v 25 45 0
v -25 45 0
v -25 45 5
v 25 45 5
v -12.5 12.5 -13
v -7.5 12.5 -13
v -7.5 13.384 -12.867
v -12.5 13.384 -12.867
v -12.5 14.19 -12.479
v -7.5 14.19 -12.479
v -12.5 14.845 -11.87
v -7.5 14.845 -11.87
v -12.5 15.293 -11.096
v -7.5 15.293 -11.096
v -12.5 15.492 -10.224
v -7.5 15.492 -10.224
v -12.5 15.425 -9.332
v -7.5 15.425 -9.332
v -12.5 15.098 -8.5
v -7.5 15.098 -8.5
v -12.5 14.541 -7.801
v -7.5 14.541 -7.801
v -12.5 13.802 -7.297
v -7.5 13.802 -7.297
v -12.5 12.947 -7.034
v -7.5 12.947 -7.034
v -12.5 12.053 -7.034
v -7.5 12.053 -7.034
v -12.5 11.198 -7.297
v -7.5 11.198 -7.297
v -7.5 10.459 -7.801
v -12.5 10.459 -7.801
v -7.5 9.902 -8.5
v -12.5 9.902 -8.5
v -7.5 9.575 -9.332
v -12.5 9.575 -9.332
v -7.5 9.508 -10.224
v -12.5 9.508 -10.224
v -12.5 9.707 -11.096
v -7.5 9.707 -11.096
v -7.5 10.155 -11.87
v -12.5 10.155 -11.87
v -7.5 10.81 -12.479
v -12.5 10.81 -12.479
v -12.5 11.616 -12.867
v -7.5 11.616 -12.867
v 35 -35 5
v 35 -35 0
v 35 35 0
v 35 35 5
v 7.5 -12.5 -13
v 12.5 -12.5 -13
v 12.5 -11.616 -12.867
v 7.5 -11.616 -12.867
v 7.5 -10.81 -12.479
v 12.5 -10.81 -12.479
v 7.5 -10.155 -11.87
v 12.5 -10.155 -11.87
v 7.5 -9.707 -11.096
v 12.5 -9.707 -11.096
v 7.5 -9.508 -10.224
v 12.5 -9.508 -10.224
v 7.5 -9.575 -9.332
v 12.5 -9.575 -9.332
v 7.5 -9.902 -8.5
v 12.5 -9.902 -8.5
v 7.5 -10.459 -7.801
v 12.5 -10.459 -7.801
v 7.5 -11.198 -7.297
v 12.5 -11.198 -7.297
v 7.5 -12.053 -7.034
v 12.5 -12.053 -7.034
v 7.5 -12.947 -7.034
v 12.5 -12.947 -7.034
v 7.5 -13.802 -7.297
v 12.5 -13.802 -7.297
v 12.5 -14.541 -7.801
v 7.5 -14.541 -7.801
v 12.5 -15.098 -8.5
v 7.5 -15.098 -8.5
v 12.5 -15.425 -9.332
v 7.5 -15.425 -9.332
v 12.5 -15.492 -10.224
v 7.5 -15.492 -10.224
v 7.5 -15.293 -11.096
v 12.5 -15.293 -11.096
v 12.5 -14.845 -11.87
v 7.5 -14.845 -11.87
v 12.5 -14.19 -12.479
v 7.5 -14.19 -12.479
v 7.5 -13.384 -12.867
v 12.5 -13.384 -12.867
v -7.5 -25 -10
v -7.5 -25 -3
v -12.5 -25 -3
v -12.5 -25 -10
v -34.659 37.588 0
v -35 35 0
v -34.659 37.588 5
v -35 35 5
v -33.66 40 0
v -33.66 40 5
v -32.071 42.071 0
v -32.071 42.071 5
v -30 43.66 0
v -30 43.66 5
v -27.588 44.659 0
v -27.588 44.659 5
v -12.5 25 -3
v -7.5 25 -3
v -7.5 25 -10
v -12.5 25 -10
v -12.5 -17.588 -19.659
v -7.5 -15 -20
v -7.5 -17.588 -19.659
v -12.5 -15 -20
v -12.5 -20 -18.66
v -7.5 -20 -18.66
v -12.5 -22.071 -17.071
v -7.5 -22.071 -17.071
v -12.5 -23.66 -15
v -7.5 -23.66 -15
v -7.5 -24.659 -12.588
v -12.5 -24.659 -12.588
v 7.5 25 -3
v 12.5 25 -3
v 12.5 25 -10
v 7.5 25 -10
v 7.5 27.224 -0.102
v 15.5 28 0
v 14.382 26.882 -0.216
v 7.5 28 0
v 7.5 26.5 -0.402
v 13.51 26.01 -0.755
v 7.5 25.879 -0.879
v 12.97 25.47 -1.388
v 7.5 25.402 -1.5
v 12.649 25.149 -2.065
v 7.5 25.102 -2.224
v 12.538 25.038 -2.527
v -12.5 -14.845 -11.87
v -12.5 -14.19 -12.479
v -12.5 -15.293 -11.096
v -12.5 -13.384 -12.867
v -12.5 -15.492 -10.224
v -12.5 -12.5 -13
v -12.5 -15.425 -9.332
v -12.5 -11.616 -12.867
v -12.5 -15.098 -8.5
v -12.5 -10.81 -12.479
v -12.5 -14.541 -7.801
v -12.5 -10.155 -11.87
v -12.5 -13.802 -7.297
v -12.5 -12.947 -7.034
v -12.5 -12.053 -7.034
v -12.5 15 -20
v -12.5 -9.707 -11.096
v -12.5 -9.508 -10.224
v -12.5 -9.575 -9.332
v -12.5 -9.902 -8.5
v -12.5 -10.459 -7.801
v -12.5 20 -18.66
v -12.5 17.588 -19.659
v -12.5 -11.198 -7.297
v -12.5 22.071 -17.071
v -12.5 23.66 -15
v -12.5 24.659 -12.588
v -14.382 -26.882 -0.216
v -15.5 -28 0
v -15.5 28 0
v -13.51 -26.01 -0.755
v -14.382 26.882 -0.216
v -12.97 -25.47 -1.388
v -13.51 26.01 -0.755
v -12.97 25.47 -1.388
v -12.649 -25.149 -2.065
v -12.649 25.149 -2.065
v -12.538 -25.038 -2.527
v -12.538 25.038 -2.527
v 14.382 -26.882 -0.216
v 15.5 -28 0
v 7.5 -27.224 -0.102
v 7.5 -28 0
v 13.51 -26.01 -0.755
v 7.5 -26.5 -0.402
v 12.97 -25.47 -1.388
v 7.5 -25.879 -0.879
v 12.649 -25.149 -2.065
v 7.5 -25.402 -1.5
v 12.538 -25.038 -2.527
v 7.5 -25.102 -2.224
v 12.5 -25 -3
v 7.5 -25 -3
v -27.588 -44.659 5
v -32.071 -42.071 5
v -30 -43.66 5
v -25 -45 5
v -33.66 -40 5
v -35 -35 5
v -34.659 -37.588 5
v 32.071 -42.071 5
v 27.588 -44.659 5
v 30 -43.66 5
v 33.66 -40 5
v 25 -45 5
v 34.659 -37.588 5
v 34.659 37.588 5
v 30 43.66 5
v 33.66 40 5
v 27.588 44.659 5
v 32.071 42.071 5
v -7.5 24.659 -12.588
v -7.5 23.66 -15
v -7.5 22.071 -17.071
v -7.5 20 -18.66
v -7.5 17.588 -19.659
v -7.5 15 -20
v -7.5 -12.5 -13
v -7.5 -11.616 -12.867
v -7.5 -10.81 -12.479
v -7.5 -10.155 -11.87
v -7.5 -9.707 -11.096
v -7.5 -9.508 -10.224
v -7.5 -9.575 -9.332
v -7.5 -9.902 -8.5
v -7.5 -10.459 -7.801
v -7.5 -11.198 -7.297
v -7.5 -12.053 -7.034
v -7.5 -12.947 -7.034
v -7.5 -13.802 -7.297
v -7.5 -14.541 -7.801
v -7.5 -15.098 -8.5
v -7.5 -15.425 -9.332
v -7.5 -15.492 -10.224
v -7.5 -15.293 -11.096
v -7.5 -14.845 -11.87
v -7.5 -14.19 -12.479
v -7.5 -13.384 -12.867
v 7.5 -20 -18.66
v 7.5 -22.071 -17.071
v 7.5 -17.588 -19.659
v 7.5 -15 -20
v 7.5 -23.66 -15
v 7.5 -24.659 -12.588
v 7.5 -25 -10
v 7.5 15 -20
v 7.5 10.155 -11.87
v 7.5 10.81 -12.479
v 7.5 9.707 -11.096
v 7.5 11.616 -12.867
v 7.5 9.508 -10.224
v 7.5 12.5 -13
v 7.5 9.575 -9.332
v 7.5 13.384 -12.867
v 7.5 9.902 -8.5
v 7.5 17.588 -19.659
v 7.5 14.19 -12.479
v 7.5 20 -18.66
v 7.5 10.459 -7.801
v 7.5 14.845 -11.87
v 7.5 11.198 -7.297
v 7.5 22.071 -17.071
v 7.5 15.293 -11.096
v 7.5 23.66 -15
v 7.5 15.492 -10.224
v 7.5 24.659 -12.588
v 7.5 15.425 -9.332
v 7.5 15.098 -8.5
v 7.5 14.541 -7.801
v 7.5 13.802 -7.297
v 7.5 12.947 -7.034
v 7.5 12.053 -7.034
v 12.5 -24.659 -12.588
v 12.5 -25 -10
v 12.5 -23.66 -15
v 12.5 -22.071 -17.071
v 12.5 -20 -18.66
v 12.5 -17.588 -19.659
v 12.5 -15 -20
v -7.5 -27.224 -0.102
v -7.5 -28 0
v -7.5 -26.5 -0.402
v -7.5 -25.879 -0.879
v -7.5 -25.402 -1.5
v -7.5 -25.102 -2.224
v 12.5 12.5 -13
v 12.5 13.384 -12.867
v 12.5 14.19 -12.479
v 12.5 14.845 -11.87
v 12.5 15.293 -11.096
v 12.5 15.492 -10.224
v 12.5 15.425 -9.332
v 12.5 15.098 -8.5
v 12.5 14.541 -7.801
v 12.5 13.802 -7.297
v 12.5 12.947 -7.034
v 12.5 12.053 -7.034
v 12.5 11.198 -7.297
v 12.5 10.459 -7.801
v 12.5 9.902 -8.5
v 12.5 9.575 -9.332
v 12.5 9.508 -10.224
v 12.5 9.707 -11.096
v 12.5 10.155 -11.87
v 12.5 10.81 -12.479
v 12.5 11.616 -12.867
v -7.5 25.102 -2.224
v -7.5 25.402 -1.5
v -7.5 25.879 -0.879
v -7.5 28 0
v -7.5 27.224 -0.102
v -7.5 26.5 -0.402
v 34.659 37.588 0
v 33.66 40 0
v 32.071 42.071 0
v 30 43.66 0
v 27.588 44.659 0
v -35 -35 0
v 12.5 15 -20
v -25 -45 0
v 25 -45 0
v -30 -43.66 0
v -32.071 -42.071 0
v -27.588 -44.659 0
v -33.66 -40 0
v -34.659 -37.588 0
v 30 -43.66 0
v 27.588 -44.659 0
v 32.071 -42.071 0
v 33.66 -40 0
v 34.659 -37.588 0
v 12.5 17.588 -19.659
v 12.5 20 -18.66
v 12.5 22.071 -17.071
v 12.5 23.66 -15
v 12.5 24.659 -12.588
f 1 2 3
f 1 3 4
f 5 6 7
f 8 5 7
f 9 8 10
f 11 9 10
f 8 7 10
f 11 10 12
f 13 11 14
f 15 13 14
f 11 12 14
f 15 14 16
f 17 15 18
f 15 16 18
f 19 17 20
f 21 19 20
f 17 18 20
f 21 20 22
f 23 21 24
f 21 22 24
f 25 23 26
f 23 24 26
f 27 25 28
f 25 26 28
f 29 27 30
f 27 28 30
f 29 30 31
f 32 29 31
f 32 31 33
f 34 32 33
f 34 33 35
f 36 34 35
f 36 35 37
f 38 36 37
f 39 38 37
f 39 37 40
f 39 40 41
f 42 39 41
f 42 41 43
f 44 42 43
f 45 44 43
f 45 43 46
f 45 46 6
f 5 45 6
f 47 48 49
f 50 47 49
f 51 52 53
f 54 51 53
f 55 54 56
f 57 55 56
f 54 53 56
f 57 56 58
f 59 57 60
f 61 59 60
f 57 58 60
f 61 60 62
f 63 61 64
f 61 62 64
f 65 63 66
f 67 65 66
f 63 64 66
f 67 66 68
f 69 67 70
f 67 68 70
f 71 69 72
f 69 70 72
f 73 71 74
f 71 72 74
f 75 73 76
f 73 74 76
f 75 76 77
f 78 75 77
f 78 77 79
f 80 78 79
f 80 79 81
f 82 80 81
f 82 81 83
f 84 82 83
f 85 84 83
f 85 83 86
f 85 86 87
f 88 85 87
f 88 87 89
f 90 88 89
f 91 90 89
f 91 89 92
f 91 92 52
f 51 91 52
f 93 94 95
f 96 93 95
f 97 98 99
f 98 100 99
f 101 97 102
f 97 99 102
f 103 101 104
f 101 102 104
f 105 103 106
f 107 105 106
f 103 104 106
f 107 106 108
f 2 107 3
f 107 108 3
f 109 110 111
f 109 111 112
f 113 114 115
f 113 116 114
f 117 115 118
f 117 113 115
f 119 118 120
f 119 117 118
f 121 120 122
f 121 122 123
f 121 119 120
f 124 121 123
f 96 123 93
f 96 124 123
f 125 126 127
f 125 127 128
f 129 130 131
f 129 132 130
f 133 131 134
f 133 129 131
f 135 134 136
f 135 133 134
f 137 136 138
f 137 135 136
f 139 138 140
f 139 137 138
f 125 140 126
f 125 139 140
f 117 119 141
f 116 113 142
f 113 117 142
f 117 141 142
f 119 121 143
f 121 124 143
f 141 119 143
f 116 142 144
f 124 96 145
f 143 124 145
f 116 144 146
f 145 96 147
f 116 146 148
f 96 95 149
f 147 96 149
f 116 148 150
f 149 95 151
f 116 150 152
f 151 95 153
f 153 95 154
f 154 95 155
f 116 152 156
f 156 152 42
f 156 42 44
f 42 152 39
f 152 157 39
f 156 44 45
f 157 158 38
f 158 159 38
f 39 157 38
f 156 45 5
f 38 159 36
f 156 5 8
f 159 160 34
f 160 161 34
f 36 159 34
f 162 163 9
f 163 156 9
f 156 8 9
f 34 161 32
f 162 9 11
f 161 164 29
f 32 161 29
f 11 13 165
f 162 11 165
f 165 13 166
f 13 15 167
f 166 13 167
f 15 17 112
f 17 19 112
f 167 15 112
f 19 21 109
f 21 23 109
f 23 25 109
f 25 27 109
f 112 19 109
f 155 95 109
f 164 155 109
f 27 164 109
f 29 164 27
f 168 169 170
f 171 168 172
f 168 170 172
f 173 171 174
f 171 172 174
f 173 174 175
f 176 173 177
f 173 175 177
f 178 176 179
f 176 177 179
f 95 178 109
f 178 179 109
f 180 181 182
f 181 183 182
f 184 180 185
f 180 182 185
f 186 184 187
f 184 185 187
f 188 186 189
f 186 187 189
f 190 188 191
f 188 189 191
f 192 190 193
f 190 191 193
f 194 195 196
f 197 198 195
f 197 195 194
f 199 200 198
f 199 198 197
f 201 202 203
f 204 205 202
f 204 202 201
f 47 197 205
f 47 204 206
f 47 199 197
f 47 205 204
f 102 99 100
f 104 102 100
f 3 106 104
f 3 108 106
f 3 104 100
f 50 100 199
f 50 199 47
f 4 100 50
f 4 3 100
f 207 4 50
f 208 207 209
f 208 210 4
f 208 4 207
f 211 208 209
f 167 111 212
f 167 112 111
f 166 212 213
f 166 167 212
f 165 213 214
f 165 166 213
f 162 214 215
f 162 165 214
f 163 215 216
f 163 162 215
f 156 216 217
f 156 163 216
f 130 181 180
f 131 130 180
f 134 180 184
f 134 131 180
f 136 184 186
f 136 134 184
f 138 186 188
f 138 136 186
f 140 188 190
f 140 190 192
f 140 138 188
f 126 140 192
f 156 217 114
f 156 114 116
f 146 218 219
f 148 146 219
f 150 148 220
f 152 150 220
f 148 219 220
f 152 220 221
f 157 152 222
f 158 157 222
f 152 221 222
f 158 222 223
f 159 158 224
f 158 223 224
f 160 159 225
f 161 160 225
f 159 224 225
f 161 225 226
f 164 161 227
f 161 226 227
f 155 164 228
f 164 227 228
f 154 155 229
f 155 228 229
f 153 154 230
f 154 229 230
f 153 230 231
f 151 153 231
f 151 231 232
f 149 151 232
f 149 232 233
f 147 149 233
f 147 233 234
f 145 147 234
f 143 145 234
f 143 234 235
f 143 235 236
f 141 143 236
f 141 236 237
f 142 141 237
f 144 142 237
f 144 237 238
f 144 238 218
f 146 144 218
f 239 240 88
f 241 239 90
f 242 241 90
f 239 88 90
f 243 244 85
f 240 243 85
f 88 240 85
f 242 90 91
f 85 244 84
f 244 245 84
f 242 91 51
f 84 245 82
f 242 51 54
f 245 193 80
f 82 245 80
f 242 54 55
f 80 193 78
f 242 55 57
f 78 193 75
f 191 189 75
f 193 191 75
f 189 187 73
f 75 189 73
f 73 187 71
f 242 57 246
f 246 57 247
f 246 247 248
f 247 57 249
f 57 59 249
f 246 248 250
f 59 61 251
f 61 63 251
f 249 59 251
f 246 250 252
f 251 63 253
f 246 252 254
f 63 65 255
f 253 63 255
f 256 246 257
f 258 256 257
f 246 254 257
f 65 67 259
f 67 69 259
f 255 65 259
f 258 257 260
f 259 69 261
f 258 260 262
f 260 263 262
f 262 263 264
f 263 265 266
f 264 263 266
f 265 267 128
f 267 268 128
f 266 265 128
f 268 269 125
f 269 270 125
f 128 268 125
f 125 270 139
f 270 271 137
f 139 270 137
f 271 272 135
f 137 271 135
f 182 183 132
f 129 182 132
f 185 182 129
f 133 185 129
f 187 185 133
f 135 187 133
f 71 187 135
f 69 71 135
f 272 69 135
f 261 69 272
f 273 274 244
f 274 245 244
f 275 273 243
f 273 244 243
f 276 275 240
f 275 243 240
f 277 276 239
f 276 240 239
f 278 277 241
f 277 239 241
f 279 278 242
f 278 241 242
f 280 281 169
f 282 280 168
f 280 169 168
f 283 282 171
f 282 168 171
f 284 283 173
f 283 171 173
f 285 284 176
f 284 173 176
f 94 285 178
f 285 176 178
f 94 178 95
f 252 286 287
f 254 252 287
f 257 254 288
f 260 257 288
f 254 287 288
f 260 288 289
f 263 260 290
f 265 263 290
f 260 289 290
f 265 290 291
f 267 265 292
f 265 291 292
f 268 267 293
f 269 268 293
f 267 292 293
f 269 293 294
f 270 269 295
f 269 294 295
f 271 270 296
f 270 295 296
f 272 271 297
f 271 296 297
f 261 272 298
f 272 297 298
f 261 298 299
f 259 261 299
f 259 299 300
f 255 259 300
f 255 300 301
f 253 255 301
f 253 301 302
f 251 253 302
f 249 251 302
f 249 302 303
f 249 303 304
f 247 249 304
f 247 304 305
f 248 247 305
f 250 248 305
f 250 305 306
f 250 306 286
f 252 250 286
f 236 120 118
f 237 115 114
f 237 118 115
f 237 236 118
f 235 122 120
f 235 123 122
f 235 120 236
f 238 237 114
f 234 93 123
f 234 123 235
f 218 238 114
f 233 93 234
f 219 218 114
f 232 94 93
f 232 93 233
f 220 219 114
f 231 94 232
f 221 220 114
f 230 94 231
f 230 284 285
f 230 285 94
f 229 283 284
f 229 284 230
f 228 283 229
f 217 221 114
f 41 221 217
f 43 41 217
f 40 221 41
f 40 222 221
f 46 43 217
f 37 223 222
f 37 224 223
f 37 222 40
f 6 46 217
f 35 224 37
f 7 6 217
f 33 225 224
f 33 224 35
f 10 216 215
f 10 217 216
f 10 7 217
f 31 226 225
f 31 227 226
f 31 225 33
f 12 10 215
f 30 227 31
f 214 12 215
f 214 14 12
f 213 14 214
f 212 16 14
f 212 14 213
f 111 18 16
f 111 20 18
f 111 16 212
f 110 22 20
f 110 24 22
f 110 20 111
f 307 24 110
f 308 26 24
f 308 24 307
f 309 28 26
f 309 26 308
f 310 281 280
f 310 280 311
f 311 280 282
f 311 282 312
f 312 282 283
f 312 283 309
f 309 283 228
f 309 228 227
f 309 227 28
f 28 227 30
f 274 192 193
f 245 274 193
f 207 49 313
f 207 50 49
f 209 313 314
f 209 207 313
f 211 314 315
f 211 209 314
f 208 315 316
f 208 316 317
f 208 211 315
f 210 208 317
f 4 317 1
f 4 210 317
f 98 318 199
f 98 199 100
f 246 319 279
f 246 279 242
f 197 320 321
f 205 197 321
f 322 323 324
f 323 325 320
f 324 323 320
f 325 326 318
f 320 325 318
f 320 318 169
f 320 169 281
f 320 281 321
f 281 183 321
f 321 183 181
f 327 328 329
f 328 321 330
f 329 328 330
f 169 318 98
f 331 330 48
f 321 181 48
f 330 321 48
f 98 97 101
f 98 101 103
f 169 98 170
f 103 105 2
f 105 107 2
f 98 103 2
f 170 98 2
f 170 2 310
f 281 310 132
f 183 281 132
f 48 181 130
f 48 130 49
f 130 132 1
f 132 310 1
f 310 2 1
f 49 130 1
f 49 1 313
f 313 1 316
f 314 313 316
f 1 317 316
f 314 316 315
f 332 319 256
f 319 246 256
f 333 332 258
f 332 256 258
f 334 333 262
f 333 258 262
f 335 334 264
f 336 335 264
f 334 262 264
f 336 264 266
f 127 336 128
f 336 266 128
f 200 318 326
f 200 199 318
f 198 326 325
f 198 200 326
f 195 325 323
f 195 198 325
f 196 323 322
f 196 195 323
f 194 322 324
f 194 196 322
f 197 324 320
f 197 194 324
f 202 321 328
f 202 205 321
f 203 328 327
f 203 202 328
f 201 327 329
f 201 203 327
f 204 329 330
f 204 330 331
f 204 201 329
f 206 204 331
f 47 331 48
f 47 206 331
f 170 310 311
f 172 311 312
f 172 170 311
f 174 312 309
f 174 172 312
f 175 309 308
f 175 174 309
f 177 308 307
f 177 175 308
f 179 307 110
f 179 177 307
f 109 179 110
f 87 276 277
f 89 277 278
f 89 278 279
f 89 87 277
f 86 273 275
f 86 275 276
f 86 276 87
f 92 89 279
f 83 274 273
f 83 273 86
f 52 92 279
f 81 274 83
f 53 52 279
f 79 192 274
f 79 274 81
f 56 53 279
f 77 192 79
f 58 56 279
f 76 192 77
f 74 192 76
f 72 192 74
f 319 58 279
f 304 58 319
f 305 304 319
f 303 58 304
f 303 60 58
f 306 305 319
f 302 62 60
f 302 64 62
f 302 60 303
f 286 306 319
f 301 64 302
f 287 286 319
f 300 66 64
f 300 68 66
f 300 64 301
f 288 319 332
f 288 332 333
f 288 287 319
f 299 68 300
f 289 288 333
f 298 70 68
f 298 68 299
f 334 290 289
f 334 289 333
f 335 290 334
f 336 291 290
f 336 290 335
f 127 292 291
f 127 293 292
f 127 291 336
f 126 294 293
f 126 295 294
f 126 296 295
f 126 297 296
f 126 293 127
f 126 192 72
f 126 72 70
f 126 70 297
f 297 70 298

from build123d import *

# Parameters (mm, degrees)
SKETCH1_W           = 70
SKETCH1_H           = 90
BOSS_EXTRUDE1_DEPTH = 5
SKETCH3_W           = 5
SKETCH3_H           = 50
BOSS_EXTRUDE2_DEPTH = 20
SKETCH4_R           = 3
CUT_EXTRUDE1_DEPTH  = 48.5
FILLET1_R           = 3
FILLET2_R           = 10
FILLET3_R           = 10


with BuildPart() as part:
    # Sketch1 → Boss-Extrude1 (new body)
    with BuildSketch(Plane.XY):
        Rectangle(SKETCH1_W, SKETCH1_H)
    extrude(amount=BOSS_EXTRUDE1_DEPTH)

    # Sketch3 → Boss-Extrude2 (add)
    with BuildSketch(Plane(origin=(0, 0, 0), x_dir=(-1, 0, 0), z_dir=(0, 0, -1))):
        with Locations((10, 0)):
            Rectangle(SKETCH3_W, SKETCH3_H)
        with Locations((-10, 0)):
            Rectangle(SKETCH3_W, SKETCH3_H)
    extrude(amount=BOSS_EXTRUDE2_DEPTH)

    # Sketch4 → Cut-Extrude1 (cut, through all)
    with BuildSketch(Plane(origin=(12.5, 0, 0), x_dir=(0, 0, -1), z_dir=(1, 0, 0))):
        with Locations((10, 12.5)):
            Circle(SKETCH4_R)
        with Locations((10, -12.5)):
            Circle(SKETCH4_R)
    extrude(amount=-CUT_EXTRUDE1_DEPTH, mode=Mode.SUBTRACT)

    # Fillet1
    fillet1_edges = [part.edges().sort_by_distance(p)[0] for p in [
        (10, 25, 0),
        (12.5, 0, 0),
        (10, -25, 0),
        (-12.5, 0, 0),
        (-10, 25, 0),
        (-10, -25, 0),
    ]]
    fillet(fillet1_edges, radius=FILLET1_R)

    # Fillet2
    fillet2_edges = [part.edges().sort_by_distance(p)[0] for p in [
        (10, 25, -20),
        (10, -25, -20),
        (-10, 25, -20),
        (-10, -25, -20),
    ]]
    fillet(fillet2_edges, radius=FILLET2_R)

    # Fillet3
    fillet3_edges = [part.edges().sort_by_distance(p)[0] for p in [
        (35, -45, 2.5),
        (-35, -45, 2.5),
        (-35, 45, 2.5),
        (35, 45, 2.5),
    ]]
    fillet(fillet3_edges, radius=FILLET3_R)


solid = part.part
